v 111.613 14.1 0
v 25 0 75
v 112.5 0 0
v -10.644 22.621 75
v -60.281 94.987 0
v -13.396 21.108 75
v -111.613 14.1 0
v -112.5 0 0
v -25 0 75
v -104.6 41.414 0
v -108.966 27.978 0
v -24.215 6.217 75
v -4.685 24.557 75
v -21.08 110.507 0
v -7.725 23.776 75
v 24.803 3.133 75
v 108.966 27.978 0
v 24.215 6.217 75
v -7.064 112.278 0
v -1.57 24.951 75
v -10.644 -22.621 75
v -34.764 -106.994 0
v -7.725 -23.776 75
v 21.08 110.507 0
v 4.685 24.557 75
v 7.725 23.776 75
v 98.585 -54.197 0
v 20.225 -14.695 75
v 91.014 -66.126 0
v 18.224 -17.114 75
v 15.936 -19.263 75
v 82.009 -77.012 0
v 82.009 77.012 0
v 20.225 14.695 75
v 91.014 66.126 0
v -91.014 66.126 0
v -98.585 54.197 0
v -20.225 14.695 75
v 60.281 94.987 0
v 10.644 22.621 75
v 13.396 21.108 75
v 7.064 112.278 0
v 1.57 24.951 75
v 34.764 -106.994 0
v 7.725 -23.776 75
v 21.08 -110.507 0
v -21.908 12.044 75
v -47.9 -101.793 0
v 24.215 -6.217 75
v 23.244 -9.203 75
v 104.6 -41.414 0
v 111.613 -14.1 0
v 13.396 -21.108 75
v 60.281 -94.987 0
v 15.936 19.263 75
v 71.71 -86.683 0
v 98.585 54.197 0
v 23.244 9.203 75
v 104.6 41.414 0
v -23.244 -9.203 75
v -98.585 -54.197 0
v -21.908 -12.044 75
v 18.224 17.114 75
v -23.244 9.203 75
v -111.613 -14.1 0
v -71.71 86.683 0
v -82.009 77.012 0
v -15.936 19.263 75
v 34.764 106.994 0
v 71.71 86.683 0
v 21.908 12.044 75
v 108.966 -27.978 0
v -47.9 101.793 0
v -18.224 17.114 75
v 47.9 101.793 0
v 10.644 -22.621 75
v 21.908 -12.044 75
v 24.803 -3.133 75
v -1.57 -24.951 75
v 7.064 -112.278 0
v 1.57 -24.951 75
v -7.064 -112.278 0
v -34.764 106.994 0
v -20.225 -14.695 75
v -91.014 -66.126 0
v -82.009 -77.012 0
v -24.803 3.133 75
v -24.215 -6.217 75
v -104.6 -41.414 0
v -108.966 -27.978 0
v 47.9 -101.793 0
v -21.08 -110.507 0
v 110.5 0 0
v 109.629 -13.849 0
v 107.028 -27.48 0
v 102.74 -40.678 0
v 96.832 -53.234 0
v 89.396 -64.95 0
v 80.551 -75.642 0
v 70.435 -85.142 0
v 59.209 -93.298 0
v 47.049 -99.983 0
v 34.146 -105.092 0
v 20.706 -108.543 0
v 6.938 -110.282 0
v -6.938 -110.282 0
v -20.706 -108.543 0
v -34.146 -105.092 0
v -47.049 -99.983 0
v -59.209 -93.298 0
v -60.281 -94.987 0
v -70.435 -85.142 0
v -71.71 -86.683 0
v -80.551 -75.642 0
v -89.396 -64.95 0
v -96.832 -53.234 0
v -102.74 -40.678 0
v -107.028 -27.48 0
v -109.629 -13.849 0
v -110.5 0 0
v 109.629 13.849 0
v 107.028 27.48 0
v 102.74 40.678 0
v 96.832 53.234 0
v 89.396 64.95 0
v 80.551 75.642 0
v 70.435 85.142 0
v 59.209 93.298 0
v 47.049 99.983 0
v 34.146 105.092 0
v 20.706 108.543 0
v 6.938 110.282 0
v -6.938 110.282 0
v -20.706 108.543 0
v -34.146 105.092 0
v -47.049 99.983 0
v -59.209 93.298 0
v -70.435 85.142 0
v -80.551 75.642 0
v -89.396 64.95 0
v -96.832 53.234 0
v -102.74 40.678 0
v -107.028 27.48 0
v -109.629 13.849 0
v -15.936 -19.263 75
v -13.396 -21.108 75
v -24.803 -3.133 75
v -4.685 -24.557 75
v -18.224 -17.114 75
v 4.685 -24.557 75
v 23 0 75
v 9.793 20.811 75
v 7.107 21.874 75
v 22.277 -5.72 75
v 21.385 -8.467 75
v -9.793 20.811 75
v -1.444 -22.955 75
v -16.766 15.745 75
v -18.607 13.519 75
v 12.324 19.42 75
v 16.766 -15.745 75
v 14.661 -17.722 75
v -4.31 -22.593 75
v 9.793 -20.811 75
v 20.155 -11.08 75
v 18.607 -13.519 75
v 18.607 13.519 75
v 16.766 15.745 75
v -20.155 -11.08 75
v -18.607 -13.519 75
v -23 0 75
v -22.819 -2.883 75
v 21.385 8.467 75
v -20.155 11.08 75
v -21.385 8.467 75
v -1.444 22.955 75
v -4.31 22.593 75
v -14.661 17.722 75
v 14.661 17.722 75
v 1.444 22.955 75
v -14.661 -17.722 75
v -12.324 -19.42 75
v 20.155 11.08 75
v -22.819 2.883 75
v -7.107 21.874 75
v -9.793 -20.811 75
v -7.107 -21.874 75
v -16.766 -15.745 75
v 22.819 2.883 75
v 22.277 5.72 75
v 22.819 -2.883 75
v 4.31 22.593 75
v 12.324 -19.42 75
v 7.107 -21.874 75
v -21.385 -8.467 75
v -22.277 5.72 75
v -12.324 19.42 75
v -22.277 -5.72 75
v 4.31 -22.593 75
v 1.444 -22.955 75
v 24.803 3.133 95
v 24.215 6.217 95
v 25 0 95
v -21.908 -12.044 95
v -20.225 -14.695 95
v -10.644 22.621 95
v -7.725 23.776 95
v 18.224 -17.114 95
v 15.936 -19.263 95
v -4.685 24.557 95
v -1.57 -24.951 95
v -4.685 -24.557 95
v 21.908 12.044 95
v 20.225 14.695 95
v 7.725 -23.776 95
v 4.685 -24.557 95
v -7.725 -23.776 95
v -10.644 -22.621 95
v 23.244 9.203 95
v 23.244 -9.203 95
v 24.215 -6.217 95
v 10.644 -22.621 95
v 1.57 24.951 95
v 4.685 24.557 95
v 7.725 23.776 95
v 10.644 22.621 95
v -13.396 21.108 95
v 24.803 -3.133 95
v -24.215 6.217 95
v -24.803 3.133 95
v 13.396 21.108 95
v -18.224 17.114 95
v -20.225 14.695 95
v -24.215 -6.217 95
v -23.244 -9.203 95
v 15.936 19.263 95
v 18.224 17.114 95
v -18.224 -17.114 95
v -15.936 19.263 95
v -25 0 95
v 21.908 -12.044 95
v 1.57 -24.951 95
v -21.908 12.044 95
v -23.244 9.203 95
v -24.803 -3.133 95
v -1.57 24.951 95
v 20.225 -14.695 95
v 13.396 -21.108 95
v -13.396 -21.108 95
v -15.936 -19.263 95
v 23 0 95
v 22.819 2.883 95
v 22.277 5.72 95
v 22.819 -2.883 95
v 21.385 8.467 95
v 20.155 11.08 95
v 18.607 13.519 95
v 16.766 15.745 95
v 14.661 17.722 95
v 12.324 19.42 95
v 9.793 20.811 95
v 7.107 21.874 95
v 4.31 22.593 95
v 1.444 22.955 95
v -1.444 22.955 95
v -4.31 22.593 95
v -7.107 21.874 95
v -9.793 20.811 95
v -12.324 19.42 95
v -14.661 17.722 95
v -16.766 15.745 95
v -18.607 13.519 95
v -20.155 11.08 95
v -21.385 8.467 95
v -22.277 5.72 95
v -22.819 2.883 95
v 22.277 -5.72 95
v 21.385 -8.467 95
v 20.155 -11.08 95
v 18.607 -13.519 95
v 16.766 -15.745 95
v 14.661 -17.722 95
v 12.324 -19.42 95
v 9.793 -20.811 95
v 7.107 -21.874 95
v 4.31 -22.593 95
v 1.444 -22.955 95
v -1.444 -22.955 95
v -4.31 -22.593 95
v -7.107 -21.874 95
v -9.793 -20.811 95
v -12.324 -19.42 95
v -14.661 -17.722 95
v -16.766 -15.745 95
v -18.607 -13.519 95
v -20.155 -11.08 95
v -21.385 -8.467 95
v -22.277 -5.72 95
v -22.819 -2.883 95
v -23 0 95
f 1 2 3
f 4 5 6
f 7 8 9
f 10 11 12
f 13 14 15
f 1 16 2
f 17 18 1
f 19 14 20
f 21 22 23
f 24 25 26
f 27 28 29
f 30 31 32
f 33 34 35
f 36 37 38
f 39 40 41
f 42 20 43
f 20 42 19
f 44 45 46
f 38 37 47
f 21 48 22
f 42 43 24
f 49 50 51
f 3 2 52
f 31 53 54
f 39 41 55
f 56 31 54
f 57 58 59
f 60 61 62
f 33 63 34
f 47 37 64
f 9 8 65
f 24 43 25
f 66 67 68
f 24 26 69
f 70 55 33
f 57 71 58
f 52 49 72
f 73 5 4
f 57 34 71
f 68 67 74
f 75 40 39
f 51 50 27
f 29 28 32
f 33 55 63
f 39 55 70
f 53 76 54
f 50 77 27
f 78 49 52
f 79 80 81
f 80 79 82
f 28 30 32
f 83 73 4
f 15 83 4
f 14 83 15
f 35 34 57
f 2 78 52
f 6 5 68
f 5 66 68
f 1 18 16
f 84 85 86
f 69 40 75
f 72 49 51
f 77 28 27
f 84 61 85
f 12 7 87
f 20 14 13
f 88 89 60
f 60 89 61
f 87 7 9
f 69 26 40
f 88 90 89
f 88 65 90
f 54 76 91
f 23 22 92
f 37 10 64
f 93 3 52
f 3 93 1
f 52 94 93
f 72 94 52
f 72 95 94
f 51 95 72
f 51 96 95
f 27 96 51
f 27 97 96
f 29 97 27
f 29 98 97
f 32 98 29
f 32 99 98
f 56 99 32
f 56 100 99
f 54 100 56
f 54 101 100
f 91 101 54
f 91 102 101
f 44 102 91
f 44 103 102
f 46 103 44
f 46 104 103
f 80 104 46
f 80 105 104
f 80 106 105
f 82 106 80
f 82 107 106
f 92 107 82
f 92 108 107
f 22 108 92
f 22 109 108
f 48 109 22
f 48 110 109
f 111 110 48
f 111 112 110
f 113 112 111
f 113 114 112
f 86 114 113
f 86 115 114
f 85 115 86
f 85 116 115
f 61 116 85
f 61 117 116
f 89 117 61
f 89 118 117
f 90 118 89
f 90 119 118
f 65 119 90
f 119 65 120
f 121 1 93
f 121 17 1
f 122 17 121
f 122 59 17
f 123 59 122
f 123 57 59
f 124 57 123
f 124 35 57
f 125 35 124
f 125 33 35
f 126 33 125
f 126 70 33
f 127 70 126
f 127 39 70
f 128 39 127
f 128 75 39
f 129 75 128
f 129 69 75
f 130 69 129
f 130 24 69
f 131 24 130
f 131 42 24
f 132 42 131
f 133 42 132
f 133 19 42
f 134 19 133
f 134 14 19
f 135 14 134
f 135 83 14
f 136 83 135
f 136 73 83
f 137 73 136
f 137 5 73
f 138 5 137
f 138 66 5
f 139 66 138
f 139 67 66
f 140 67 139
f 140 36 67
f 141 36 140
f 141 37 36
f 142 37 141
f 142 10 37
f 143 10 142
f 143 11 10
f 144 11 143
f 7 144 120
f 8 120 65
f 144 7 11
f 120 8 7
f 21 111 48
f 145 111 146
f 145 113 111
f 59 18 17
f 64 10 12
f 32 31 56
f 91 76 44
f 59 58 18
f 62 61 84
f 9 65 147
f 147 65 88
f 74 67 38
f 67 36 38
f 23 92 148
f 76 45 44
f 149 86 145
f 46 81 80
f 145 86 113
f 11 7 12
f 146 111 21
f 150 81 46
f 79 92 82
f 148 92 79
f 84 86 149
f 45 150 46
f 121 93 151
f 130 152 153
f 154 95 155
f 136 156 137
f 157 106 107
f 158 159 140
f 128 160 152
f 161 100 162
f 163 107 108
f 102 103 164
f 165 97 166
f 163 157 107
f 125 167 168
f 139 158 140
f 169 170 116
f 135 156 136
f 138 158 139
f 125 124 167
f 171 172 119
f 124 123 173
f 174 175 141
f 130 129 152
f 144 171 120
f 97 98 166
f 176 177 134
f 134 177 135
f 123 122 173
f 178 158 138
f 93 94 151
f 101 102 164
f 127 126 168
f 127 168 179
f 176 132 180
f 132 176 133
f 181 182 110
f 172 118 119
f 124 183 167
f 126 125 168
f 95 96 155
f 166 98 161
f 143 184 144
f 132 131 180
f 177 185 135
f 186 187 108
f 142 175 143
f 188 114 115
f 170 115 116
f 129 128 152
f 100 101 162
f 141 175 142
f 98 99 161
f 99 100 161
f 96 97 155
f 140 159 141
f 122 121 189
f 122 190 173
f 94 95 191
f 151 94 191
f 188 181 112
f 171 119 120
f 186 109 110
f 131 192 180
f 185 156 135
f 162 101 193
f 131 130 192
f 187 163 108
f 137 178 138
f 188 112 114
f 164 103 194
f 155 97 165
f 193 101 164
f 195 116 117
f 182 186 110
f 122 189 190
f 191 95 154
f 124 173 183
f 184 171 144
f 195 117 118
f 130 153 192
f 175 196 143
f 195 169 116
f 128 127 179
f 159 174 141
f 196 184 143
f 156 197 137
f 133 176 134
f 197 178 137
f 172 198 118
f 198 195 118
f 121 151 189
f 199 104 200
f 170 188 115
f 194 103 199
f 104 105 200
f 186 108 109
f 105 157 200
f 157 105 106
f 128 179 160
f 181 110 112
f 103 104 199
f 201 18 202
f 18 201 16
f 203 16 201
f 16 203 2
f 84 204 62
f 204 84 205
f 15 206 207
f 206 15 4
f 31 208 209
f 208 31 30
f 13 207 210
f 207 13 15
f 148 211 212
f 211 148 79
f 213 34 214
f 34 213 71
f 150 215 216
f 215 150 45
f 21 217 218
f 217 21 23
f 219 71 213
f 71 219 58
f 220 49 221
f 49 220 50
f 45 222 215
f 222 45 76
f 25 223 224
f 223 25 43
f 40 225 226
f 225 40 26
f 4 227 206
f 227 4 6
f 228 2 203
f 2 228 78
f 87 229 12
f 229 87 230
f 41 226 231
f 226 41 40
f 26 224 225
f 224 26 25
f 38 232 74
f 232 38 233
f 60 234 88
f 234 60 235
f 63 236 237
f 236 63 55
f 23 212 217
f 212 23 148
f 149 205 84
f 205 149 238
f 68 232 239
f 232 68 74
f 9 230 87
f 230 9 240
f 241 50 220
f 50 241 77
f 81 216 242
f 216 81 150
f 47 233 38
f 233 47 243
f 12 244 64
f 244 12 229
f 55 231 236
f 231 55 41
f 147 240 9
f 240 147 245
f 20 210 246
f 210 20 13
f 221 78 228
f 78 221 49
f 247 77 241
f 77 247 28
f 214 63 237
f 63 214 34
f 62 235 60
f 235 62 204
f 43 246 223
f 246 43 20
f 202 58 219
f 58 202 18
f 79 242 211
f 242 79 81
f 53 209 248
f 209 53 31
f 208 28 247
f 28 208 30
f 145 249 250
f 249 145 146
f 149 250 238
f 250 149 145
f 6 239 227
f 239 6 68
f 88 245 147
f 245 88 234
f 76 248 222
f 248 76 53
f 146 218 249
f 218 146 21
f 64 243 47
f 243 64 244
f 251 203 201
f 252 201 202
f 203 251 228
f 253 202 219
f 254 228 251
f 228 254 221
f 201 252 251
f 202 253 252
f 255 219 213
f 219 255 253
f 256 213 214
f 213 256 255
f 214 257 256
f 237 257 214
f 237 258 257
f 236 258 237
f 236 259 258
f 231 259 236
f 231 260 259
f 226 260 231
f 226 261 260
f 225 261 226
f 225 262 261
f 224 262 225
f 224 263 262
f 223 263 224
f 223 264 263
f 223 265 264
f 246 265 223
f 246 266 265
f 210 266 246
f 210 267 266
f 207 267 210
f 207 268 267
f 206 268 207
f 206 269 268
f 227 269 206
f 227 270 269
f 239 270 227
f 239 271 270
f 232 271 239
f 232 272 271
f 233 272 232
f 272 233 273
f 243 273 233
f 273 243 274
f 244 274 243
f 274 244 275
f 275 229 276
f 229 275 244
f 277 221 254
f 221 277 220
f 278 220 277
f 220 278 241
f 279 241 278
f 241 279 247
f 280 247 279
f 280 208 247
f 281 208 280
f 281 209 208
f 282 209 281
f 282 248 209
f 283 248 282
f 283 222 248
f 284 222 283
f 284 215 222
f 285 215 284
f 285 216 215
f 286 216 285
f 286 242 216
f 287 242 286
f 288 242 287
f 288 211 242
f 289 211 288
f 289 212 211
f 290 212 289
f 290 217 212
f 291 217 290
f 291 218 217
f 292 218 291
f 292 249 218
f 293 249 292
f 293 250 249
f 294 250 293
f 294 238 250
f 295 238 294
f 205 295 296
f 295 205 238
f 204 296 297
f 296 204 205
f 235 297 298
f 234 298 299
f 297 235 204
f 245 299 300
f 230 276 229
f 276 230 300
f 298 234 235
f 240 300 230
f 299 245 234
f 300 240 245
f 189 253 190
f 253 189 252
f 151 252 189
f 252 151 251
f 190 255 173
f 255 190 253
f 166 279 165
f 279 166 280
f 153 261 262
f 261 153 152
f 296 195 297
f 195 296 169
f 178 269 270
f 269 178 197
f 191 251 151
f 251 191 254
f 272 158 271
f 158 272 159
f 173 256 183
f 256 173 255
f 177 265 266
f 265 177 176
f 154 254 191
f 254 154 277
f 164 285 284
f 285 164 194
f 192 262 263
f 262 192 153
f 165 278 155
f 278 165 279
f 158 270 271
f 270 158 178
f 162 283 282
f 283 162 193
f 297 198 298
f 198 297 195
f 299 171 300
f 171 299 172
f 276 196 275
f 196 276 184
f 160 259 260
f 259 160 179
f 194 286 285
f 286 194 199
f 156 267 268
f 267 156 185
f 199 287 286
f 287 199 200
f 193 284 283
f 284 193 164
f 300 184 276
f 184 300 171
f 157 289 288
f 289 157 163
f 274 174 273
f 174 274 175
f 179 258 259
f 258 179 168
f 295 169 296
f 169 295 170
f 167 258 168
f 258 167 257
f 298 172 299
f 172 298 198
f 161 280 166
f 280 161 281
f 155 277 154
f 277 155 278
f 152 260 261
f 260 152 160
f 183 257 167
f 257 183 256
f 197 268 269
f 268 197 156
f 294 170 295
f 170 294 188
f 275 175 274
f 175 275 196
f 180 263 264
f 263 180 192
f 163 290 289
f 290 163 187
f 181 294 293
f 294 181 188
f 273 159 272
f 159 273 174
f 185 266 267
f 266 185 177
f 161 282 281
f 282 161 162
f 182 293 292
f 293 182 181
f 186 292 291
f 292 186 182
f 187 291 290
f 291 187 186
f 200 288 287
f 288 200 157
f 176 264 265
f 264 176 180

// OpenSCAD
$fn = 50;


difference() {
	union() {
		translate(v = [0, 0, 0]) {
			rotate(a = [0, 0, 0]) {
				difference() {
					union() {
						cylinder(h = 75, r1 = 112.5000000000, r2 = 25.0000000000);
					}
					union() {
						cylinder(h = 75, r1 = 110.5000000000, r2 = 23.0000000000);
					}
				}
			}
		}
		translate(v = [0, 0, 75]) {
			rotate(a = [0, 0, 0]) {
				difference() {
					union() {
						cylinder(h = 20, r = 25.0000000000);
					}
					union() {
						cylinder(h = 20, r = 23.0000000000);
					}
				}
			}
		}
	}
	union();
}
